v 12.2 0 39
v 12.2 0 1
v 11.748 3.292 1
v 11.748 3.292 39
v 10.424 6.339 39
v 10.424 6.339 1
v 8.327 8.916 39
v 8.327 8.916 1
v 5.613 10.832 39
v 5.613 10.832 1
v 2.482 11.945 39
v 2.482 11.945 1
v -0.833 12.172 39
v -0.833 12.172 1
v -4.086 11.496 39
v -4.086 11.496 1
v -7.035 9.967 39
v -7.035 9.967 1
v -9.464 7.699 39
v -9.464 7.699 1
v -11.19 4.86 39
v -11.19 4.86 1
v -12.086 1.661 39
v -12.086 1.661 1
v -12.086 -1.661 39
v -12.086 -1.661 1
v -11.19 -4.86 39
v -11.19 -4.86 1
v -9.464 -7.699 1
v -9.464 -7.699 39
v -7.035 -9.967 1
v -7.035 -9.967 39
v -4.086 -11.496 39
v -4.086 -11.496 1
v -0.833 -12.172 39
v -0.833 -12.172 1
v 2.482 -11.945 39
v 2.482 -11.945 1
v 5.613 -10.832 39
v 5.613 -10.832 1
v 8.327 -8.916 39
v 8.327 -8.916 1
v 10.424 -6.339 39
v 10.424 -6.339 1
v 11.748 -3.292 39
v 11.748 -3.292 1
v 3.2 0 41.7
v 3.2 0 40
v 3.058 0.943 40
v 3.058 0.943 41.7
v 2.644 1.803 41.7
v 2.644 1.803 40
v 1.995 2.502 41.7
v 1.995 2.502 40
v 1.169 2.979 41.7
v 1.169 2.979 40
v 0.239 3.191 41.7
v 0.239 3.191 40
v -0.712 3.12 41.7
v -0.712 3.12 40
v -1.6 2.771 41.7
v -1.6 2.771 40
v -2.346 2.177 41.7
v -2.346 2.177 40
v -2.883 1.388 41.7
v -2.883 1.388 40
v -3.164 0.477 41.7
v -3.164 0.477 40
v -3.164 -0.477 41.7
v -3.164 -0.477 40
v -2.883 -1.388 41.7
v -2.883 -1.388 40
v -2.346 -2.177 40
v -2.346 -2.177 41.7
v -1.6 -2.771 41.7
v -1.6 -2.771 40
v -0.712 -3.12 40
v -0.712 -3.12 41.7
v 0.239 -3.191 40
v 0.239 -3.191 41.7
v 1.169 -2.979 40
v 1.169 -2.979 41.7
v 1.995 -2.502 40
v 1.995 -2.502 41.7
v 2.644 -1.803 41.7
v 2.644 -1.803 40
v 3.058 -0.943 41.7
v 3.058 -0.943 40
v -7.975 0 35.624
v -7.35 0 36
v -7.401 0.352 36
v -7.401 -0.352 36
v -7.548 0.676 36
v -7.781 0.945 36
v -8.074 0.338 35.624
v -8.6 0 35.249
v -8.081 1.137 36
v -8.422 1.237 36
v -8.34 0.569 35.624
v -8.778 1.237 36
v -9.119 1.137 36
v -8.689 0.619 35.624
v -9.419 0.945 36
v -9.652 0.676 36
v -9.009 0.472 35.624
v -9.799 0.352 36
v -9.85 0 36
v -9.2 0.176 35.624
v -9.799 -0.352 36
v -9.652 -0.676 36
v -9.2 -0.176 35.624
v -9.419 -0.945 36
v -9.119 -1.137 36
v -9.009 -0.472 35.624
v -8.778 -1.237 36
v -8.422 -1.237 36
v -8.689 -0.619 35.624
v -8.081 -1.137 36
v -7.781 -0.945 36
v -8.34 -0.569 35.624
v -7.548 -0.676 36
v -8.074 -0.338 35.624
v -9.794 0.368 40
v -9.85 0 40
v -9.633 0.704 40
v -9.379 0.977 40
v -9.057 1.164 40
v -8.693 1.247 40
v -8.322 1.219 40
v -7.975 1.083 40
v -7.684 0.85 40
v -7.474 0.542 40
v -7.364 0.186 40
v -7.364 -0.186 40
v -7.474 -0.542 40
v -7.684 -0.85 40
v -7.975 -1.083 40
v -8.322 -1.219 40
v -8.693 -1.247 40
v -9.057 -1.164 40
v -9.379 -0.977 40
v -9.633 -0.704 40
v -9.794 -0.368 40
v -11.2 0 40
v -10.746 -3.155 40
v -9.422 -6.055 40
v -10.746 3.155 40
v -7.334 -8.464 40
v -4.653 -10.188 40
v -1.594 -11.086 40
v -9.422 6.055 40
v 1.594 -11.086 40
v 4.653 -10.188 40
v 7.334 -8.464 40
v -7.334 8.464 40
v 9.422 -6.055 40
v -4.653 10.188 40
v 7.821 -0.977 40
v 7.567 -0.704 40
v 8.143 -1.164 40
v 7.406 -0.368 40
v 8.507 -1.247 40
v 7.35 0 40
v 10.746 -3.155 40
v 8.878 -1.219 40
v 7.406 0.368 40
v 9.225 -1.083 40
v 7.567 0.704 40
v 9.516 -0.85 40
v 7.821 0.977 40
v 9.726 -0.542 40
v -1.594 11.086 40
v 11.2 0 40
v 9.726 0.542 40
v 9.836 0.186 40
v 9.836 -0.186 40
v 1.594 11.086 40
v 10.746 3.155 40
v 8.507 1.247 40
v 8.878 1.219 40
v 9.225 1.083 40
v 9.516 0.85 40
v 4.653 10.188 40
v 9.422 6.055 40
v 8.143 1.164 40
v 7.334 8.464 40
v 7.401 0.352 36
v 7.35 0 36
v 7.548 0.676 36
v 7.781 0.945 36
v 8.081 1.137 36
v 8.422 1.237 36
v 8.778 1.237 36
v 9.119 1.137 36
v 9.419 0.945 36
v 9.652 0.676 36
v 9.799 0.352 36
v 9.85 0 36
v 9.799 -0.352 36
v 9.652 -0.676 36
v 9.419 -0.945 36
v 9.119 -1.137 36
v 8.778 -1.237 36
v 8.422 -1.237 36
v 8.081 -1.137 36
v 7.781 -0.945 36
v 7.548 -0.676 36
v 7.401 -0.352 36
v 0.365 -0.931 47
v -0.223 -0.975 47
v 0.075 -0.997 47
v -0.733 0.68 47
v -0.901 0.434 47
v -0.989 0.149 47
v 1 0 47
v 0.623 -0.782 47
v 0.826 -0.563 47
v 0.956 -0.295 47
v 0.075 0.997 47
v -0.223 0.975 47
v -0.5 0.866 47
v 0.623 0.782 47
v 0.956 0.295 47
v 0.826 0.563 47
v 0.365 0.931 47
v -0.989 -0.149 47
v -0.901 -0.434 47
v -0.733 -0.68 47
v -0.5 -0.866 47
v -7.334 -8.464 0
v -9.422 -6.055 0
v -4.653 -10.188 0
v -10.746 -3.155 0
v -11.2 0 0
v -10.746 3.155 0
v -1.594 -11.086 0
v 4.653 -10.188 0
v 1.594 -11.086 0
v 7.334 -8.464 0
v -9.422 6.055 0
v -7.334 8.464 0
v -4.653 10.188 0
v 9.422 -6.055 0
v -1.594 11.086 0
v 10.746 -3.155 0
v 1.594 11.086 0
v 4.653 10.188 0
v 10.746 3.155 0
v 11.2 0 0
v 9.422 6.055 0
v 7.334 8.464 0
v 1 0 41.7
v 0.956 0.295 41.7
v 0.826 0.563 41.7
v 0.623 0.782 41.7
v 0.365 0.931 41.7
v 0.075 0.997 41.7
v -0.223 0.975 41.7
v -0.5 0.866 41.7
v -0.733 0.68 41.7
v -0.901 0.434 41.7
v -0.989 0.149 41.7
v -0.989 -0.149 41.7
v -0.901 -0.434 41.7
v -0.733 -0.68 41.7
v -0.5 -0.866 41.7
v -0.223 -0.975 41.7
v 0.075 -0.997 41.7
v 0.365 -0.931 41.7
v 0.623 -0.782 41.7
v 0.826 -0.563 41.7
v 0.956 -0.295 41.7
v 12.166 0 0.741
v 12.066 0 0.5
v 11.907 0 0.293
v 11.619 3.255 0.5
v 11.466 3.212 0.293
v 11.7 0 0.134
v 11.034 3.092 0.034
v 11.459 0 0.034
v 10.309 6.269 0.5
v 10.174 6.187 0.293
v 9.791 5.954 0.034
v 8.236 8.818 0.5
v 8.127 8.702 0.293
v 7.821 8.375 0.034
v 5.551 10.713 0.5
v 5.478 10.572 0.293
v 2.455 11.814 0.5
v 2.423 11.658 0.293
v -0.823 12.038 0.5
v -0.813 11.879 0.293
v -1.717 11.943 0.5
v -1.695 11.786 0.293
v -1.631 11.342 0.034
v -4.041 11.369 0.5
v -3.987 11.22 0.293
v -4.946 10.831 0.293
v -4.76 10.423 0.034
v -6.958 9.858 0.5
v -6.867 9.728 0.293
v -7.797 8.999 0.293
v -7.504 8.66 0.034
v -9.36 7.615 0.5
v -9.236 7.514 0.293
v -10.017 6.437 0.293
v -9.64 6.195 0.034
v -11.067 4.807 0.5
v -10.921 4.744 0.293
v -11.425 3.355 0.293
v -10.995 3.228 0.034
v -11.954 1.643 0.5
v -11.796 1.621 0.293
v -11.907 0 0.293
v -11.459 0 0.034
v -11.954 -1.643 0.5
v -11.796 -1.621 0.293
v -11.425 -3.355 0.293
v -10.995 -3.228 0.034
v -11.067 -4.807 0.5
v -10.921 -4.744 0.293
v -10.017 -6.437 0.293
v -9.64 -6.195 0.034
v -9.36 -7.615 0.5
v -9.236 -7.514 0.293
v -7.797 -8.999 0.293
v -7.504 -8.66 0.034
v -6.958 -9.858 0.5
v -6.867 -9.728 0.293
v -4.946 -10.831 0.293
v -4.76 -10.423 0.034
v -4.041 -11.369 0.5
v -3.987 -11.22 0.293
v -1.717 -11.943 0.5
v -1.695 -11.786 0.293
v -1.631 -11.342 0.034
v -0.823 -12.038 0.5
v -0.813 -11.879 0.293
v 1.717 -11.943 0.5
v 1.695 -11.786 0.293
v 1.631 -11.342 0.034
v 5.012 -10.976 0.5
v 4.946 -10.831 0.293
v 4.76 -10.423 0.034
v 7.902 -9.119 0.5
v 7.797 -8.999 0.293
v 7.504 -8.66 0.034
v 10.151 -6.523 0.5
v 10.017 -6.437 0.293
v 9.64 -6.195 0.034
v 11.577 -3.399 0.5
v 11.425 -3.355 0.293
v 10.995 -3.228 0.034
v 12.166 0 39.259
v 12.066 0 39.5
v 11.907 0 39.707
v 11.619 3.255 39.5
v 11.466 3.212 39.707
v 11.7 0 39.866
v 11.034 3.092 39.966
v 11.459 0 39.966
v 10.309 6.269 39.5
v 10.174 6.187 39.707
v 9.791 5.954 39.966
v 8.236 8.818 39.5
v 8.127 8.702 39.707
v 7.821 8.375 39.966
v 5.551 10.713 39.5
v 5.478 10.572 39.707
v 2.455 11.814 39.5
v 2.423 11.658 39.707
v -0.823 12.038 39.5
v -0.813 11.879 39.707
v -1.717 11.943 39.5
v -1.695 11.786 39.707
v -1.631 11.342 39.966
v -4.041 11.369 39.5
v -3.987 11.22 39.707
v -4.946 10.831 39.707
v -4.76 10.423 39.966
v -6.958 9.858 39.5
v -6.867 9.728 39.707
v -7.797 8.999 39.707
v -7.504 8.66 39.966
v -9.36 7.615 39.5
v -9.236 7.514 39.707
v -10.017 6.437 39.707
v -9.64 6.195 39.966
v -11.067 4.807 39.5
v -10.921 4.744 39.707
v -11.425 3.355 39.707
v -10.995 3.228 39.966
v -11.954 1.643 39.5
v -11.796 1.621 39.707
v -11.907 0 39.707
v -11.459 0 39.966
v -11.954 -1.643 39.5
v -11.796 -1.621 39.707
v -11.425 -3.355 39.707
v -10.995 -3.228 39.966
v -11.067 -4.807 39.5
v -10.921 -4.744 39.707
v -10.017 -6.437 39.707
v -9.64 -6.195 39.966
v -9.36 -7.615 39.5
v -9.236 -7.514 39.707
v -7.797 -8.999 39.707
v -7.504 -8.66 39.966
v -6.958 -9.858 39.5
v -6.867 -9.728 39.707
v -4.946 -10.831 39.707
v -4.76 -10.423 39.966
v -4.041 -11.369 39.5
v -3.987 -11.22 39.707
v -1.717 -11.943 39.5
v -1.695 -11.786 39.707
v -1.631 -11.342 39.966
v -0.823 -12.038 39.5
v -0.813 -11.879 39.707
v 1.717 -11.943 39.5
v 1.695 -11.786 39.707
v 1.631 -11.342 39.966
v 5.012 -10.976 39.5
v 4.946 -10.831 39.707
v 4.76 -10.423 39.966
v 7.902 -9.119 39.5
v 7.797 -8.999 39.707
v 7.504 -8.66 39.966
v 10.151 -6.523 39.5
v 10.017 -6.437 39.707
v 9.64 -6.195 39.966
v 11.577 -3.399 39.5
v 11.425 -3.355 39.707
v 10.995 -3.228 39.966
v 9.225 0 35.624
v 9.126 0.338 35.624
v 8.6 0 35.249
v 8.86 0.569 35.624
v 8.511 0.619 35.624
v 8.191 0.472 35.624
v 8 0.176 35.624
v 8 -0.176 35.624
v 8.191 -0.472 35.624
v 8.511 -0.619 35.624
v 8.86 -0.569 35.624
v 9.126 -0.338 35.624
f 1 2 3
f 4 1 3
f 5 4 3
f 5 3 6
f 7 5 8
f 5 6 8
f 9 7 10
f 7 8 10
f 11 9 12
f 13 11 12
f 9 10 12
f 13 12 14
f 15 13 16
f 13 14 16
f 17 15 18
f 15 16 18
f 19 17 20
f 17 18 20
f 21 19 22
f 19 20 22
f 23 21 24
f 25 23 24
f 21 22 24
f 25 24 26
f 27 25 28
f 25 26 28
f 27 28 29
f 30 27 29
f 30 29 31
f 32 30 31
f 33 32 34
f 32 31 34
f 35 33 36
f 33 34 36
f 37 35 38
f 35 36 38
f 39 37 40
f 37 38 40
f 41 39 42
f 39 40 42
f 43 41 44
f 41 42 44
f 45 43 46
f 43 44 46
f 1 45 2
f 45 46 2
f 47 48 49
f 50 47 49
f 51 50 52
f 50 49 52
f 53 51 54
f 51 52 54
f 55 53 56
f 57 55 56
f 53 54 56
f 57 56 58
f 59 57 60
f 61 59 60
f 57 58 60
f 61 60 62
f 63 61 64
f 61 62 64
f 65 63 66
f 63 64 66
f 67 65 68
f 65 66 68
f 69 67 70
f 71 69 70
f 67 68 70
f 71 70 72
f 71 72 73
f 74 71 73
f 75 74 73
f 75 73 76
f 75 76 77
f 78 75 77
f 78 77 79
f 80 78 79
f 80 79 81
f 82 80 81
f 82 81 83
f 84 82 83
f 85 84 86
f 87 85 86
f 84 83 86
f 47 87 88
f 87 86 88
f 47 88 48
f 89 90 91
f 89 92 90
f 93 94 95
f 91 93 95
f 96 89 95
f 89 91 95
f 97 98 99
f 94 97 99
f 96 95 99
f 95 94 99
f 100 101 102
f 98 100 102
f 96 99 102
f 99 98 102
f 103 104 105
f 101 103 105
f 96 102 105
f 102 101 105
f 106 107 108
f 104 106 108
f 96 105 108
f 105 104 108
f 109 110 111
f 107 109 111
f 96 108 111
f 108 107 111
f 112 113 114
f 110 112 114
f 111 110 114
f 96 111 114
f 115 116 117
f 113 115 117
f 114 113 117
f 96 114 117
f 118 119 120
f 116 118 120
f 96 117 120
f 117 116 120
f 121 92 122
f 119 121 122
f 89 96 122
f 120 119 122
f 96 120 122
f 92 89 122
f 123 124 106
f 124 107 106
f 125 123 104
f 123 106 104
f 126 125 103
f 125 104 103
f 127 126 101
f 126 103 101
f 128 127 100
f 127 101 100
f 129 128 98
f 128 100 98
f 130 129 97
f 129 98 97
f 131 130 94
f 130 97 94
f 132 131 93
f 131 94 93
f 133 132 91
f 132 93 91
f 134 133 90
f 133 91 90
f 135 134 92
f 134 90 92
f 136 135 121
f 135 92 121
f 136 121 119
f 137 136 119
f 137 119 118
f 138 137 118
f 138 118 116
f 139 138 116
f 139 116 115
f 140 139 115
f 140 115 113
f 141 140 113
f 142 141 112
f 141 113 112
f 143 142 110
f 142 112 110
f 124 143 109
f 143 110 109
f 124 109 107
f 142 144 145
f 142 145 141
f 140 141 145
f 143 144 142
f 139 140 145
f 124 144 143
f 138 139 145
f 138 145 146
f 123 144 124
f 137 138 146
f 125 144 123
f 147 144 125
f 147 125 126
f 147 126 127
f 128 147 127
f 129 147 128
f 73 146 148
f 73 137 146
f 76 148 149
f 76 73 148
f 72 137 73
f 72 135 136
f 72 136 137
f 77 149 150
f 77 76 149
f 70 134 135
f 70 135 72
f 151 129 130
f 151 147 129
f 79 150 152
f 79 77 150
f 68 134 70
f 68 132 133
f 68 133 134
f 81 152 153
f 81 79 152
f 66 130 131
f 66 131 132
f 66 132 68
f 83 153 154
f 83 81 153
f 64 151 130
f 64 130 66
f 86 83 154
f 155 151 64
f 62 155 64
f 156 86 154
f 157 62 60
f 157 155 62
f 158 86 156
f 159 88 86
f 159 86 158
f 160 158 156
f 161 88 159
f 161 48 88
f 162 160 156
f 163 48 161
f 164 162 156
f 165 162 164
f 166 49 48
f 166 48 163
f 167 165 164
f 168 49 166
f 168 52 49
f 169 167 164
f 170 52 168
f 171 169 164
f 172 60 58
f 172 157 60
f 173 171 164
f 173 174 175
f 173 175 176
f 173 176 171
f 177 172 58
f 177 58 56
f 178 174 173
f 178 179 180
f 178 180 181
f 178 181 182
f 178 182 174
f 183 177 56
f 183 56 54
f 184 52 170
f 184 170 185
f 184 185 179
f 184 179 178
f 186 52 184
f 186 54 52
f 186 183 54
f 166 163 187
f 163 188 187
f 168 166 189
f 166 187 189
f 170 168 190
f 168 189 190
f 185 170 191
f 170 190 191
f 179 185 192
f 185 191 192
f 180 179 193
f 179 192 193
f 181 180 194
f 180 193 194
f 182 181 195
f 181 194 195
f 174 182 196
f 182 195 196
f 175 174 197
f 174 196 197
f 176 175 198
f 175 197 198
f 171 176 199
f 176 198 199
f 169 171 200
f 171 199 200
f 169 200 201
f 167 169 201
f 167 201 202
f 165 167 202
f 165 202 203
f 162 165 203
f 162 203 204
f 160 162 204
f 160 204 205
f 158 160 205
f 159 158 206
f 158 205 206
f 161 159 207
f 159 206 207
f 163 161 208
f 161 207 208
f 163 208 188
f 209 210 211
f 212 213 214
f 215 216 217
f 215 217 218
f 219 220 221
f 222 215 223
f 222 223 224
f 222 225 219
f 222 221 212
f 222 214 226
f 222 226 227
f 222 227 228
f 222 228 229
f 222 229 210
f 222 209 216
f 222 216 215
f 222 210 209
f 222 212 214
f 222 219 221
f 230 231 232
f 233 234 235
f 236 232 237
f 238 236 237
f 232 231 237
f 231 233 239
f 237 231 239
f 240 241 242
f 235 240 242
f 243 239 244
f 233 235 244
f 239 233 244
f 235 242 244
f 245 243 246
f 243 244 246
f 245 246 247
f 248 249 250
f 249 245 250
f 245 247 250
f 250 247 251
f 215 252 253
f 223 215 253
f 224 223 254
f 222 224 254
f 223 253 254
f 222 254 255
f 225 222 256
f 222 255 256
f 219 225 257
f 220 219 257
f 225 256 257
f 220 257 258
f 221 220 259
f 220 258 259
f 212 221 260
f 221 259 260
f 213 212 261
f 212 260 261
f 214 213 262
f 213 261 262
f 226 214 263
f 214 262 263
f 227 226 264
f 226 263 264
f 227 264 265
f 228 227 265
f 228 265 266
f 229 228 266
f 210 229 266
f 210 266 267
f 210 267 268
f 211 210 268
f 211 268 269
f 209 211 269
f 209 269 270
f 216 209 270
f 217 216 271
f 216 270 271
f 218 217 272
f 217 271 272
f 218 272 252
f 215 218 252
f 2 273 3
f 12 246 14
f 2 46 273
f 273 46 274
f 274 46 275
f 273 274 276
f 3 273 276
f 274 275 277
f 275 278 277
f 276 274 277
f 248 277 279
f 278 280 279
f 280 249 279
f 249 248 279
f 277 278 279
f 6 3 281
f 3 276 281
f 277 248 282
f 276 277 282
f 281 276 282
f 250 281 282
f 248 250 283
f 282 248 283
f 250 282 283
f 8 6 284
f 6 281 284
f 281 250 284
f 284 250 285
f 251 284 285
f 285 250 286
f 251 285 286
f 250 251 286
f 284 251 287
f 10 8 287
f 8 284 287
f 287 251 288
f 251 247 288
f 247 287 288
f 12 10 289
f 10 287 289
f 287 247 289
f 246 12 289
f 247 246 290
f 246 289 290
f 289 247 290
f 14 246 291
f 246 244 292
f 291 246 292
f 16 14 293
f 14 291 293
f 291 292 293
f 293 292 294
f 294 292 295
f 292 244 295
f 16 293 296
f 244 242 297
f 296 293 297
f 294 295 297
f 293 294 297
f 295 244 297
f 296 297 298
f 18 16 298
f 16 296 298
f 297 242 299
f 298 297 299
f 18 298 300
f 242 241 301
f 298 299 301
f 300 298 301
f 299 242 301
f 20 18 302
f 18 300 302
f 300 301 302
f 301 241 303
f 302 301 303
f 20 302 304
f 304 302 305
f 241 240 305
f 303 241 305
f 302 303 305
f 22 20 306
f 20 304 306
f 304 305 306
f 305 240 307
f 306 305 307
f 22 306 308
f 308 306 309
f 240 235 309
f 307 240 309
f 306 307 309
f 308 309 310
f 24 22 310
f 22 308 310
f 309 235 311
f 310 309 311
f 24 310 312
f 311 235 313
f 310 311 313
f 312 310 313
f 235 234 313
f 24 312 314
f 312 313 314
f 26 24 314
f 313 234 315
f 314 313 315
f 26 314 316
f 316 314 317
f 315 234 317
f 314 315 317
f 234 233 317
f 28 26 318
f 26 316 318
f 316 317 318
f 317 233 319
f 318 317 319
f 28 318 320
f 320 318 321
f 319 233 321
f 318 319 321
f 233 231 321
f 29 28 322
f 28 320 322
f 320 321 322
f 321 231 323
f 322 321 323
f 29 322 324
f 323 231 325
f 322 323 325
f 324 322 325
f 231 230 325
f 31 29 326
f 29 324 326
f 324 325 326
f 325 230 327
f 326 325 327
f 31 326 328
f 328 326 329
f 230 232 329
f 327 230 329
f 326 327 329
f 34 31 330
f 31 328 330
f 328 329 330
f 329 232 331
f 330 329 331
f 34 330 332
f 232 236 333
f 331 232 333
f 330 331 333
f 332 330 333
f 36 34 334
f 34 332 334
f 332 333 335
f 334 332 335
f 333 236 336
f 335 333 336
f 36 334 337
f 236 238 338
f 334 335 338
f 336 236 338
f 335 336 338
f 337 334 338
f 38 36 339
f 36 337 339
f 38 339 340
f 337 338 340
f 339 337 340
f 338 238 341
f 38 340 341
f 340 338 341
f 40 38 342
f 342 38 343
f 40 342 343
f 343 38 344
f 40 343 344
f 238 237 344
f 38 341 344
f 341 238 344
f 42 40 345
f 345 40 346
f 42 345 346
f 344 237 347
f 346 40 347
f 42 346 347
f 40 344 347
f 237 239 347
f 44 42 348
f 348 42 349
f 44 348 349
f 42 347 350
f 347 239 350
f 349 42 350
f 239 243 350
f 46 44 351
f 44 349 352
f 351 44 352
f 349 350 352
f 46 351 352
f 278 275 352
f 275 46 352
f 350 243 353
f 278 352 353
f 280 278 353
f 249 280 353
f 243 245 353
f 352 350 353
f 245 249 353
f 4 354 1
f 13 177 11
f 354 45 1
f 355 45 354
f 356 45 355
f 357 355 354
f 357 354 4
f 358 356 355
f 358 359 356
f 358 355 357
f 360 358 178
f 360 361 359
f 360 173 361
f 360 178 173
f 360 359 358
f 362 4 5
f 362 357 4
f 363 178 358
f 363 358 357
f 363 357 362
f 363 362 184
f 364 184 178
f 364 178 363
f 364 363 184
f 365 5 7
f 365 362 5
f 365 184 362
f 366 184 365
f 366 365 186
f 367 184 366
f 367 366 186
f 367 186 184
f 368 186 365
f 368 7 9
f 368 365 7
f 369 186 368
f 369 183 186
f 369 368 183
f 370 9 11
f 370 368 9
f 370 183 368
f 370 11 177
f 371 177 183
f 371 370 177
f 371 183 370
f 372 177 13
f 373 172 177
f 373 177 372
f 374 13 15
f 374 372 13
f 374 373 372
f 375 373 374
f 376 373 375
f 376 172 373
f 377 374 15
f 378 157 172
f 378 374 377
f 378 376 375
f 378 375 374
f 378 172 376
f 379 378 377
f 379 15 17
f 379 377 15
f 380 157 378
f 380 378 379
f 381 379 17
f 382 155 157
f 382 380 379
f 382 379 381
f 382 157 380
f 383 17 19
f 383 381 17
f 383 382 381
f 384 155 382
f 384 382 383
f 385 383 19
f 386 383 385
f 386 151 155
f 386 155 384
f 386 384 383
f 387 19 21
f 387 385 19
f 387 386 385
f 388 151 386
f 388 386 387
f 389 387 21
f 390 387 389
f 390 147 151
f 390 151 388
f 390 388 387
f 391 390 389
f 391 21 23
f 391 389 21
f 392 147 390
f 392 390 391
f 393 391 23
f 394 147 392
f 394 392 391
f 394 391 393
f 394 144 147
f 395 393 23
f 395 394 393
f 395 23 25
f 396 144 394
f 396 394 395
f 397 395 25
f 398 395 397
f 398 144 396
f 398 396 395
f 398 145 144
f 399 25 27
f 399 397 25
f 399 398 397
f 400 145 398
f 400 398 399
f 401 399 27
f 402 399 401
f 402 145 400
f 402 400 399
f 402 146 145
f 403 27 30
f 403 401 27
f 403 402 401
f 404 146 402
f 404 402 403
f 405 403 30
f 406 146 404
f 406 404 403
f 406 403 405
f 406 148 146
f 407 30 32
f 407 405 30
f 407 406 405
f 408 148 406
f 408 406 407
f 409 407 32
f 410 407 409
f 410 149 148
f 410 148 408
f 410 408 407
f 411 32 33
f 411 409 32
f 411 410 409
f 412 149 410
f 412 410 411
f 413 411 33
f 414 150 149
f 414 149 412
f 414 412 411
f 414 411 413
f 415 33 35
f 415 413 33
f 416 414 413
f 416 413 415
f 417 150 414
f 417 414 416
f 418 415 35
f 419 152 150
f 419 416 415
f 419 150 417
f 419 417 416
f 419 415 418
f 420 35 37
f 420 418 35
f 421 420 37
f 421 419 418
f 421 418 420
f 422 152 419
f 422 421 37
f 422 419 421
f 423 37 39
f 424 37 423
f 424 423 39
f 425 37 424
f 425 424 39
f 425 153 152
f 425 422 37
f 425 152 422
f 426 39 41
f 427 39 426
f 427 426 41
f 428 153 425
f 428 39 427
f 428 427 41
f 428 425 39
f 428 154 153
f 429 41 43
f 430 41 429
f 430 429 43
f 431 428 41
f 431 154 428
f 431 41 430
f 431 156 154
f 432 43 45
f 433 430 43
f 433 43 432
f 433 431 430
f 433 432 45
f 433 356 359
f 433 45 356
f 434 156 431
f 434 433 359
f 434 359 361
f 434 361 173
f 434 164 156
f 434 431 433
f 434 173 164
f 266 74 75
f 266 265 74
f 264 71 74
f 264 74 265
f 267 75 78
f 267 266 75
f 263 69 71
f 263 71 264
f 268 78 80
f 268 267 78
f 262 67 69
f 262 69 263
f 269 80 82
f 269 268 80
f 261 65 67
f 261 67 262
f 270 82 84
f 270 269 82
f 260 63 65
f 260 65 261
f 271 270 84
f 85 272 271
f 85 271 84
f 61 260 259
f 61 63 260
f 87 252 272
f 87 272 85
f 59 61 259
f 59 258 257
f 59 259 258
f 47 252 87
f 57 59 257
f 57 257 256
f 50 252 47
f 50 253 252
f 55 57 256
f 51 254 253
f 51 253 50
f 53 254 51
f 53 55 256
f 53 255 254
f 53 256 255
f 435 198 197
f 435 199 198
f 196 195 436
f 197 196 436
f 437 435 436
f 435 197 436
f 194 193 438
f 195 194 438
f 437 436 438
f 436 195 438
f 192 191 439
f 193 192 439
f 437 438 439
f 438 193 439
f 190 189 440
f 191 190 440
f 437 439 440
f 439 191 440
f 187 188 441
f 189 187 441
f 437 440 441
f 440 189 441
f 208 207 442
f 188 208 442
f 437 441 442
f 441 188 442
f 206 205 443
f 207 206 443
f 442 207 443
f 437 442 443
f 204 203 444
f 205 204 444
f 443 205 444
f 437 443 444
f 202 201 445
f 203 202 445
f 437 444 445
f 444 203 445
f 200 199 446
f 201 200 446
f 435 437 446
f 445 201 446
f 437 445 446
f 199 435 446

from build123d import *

# Parameters (mm, degrees)
ESBO_O1_R                                   = 12.2
RESSALTO_EXTRUS_O1_DEPTH                    = 40
ESBO_O2_R                                   = 3.2
RESSALTO_EXTRUS_O2_DEPTH                    = 1.7
ESBO_O3_R                                   = 1
RESSALTO_EXTRUS_O3_DEPTH                    = 5.3
BROCA_DE_ROSQUEAR_PARA_TARRAXA_DE_M31_D     = 2.5
BROCA_DE_ROSQUEAR_PARA_TARRAXA_DE_M31_DEPTH = 4
BROCA_DE_ROSQUEAR_PARA_TARRAXA_DE_M31_TIP   = 0.751075774
FILETE1_R                                   = 1
FILETE2_R                                   = 1


with BuildPart() as part:
    # Esboço1 → Ressalto-extrusão1 (new body)
    with BuildSketch(Plane.XY):
        Circle(ESBO_O1_R)
    extrude(amount=RESSALTO_EXTRUS_O1_DEPTH)

    # Esboço2 → Ressalto-extrusão2 (add)
    with BuildSketch(Plane.XY.offset(40)):
        Circle(ESBO_O2_R)
    extrude(amount=RESSALTO_EXTRUS_O2_DEPTH)

    # Esboço3 → Ressalto-extrusão3 (add)
    with BuildSketch(Plane.XY.offset(41.7)):
        Circle(ESBO_O3_R)
    extrude(amount=RESSALTO_EXTRUS_O3_DEPTH)

    # Broca de rosquear para tarraxa de M31
    with Locations(Plane(origin=(-8.6, 0, 40), x_dir=(1, 0, 0), z_dir=(0, 0, 1))):
        with Locations((0, 0), (17.2, 0)):
            Hole(BROCA_DE_ROSQUEAR_PARA_TARRAXA_DE_M31_D / 2, depth=BROCA_DE_ROSQUEAR_PARA_TARRAXA_DE_M31_DEPTH)
            with Locations((0, 0, -(BROCA_DE_ROSQUEAR_PARA_TARRAXA_DE_M31_DEPTH + BROCA_DE_ROSQUEAR_PARA_TARRAXA_DE_M31_TIP / 2))):  # 118° drill point
                Cone(0, BROCA_DE_ROSQUEAR_PARA_TARRAXA_DE_M31_D / 2, BROCA_DE_ROSQUEAR_PARA_TARRAXA_DE_M31_TIP, mode=Mode.SUBTRACT)

    # Filete1
    filete1_edges = [part.edges().sort_by_distance(p)[0] for p in [
        (-12.2, 0, 40),
    ]]
    fillet(filete1_edges, radius=FILETE1_R)

    # Filete2
    filete2_edges = [part.edges().sort_by_distance(p)[0] for p in [
        (-12.2, 0, 0),
    ]]
    fillet(filete2_edges, radius=FILETE2_R)


solid = part.part
